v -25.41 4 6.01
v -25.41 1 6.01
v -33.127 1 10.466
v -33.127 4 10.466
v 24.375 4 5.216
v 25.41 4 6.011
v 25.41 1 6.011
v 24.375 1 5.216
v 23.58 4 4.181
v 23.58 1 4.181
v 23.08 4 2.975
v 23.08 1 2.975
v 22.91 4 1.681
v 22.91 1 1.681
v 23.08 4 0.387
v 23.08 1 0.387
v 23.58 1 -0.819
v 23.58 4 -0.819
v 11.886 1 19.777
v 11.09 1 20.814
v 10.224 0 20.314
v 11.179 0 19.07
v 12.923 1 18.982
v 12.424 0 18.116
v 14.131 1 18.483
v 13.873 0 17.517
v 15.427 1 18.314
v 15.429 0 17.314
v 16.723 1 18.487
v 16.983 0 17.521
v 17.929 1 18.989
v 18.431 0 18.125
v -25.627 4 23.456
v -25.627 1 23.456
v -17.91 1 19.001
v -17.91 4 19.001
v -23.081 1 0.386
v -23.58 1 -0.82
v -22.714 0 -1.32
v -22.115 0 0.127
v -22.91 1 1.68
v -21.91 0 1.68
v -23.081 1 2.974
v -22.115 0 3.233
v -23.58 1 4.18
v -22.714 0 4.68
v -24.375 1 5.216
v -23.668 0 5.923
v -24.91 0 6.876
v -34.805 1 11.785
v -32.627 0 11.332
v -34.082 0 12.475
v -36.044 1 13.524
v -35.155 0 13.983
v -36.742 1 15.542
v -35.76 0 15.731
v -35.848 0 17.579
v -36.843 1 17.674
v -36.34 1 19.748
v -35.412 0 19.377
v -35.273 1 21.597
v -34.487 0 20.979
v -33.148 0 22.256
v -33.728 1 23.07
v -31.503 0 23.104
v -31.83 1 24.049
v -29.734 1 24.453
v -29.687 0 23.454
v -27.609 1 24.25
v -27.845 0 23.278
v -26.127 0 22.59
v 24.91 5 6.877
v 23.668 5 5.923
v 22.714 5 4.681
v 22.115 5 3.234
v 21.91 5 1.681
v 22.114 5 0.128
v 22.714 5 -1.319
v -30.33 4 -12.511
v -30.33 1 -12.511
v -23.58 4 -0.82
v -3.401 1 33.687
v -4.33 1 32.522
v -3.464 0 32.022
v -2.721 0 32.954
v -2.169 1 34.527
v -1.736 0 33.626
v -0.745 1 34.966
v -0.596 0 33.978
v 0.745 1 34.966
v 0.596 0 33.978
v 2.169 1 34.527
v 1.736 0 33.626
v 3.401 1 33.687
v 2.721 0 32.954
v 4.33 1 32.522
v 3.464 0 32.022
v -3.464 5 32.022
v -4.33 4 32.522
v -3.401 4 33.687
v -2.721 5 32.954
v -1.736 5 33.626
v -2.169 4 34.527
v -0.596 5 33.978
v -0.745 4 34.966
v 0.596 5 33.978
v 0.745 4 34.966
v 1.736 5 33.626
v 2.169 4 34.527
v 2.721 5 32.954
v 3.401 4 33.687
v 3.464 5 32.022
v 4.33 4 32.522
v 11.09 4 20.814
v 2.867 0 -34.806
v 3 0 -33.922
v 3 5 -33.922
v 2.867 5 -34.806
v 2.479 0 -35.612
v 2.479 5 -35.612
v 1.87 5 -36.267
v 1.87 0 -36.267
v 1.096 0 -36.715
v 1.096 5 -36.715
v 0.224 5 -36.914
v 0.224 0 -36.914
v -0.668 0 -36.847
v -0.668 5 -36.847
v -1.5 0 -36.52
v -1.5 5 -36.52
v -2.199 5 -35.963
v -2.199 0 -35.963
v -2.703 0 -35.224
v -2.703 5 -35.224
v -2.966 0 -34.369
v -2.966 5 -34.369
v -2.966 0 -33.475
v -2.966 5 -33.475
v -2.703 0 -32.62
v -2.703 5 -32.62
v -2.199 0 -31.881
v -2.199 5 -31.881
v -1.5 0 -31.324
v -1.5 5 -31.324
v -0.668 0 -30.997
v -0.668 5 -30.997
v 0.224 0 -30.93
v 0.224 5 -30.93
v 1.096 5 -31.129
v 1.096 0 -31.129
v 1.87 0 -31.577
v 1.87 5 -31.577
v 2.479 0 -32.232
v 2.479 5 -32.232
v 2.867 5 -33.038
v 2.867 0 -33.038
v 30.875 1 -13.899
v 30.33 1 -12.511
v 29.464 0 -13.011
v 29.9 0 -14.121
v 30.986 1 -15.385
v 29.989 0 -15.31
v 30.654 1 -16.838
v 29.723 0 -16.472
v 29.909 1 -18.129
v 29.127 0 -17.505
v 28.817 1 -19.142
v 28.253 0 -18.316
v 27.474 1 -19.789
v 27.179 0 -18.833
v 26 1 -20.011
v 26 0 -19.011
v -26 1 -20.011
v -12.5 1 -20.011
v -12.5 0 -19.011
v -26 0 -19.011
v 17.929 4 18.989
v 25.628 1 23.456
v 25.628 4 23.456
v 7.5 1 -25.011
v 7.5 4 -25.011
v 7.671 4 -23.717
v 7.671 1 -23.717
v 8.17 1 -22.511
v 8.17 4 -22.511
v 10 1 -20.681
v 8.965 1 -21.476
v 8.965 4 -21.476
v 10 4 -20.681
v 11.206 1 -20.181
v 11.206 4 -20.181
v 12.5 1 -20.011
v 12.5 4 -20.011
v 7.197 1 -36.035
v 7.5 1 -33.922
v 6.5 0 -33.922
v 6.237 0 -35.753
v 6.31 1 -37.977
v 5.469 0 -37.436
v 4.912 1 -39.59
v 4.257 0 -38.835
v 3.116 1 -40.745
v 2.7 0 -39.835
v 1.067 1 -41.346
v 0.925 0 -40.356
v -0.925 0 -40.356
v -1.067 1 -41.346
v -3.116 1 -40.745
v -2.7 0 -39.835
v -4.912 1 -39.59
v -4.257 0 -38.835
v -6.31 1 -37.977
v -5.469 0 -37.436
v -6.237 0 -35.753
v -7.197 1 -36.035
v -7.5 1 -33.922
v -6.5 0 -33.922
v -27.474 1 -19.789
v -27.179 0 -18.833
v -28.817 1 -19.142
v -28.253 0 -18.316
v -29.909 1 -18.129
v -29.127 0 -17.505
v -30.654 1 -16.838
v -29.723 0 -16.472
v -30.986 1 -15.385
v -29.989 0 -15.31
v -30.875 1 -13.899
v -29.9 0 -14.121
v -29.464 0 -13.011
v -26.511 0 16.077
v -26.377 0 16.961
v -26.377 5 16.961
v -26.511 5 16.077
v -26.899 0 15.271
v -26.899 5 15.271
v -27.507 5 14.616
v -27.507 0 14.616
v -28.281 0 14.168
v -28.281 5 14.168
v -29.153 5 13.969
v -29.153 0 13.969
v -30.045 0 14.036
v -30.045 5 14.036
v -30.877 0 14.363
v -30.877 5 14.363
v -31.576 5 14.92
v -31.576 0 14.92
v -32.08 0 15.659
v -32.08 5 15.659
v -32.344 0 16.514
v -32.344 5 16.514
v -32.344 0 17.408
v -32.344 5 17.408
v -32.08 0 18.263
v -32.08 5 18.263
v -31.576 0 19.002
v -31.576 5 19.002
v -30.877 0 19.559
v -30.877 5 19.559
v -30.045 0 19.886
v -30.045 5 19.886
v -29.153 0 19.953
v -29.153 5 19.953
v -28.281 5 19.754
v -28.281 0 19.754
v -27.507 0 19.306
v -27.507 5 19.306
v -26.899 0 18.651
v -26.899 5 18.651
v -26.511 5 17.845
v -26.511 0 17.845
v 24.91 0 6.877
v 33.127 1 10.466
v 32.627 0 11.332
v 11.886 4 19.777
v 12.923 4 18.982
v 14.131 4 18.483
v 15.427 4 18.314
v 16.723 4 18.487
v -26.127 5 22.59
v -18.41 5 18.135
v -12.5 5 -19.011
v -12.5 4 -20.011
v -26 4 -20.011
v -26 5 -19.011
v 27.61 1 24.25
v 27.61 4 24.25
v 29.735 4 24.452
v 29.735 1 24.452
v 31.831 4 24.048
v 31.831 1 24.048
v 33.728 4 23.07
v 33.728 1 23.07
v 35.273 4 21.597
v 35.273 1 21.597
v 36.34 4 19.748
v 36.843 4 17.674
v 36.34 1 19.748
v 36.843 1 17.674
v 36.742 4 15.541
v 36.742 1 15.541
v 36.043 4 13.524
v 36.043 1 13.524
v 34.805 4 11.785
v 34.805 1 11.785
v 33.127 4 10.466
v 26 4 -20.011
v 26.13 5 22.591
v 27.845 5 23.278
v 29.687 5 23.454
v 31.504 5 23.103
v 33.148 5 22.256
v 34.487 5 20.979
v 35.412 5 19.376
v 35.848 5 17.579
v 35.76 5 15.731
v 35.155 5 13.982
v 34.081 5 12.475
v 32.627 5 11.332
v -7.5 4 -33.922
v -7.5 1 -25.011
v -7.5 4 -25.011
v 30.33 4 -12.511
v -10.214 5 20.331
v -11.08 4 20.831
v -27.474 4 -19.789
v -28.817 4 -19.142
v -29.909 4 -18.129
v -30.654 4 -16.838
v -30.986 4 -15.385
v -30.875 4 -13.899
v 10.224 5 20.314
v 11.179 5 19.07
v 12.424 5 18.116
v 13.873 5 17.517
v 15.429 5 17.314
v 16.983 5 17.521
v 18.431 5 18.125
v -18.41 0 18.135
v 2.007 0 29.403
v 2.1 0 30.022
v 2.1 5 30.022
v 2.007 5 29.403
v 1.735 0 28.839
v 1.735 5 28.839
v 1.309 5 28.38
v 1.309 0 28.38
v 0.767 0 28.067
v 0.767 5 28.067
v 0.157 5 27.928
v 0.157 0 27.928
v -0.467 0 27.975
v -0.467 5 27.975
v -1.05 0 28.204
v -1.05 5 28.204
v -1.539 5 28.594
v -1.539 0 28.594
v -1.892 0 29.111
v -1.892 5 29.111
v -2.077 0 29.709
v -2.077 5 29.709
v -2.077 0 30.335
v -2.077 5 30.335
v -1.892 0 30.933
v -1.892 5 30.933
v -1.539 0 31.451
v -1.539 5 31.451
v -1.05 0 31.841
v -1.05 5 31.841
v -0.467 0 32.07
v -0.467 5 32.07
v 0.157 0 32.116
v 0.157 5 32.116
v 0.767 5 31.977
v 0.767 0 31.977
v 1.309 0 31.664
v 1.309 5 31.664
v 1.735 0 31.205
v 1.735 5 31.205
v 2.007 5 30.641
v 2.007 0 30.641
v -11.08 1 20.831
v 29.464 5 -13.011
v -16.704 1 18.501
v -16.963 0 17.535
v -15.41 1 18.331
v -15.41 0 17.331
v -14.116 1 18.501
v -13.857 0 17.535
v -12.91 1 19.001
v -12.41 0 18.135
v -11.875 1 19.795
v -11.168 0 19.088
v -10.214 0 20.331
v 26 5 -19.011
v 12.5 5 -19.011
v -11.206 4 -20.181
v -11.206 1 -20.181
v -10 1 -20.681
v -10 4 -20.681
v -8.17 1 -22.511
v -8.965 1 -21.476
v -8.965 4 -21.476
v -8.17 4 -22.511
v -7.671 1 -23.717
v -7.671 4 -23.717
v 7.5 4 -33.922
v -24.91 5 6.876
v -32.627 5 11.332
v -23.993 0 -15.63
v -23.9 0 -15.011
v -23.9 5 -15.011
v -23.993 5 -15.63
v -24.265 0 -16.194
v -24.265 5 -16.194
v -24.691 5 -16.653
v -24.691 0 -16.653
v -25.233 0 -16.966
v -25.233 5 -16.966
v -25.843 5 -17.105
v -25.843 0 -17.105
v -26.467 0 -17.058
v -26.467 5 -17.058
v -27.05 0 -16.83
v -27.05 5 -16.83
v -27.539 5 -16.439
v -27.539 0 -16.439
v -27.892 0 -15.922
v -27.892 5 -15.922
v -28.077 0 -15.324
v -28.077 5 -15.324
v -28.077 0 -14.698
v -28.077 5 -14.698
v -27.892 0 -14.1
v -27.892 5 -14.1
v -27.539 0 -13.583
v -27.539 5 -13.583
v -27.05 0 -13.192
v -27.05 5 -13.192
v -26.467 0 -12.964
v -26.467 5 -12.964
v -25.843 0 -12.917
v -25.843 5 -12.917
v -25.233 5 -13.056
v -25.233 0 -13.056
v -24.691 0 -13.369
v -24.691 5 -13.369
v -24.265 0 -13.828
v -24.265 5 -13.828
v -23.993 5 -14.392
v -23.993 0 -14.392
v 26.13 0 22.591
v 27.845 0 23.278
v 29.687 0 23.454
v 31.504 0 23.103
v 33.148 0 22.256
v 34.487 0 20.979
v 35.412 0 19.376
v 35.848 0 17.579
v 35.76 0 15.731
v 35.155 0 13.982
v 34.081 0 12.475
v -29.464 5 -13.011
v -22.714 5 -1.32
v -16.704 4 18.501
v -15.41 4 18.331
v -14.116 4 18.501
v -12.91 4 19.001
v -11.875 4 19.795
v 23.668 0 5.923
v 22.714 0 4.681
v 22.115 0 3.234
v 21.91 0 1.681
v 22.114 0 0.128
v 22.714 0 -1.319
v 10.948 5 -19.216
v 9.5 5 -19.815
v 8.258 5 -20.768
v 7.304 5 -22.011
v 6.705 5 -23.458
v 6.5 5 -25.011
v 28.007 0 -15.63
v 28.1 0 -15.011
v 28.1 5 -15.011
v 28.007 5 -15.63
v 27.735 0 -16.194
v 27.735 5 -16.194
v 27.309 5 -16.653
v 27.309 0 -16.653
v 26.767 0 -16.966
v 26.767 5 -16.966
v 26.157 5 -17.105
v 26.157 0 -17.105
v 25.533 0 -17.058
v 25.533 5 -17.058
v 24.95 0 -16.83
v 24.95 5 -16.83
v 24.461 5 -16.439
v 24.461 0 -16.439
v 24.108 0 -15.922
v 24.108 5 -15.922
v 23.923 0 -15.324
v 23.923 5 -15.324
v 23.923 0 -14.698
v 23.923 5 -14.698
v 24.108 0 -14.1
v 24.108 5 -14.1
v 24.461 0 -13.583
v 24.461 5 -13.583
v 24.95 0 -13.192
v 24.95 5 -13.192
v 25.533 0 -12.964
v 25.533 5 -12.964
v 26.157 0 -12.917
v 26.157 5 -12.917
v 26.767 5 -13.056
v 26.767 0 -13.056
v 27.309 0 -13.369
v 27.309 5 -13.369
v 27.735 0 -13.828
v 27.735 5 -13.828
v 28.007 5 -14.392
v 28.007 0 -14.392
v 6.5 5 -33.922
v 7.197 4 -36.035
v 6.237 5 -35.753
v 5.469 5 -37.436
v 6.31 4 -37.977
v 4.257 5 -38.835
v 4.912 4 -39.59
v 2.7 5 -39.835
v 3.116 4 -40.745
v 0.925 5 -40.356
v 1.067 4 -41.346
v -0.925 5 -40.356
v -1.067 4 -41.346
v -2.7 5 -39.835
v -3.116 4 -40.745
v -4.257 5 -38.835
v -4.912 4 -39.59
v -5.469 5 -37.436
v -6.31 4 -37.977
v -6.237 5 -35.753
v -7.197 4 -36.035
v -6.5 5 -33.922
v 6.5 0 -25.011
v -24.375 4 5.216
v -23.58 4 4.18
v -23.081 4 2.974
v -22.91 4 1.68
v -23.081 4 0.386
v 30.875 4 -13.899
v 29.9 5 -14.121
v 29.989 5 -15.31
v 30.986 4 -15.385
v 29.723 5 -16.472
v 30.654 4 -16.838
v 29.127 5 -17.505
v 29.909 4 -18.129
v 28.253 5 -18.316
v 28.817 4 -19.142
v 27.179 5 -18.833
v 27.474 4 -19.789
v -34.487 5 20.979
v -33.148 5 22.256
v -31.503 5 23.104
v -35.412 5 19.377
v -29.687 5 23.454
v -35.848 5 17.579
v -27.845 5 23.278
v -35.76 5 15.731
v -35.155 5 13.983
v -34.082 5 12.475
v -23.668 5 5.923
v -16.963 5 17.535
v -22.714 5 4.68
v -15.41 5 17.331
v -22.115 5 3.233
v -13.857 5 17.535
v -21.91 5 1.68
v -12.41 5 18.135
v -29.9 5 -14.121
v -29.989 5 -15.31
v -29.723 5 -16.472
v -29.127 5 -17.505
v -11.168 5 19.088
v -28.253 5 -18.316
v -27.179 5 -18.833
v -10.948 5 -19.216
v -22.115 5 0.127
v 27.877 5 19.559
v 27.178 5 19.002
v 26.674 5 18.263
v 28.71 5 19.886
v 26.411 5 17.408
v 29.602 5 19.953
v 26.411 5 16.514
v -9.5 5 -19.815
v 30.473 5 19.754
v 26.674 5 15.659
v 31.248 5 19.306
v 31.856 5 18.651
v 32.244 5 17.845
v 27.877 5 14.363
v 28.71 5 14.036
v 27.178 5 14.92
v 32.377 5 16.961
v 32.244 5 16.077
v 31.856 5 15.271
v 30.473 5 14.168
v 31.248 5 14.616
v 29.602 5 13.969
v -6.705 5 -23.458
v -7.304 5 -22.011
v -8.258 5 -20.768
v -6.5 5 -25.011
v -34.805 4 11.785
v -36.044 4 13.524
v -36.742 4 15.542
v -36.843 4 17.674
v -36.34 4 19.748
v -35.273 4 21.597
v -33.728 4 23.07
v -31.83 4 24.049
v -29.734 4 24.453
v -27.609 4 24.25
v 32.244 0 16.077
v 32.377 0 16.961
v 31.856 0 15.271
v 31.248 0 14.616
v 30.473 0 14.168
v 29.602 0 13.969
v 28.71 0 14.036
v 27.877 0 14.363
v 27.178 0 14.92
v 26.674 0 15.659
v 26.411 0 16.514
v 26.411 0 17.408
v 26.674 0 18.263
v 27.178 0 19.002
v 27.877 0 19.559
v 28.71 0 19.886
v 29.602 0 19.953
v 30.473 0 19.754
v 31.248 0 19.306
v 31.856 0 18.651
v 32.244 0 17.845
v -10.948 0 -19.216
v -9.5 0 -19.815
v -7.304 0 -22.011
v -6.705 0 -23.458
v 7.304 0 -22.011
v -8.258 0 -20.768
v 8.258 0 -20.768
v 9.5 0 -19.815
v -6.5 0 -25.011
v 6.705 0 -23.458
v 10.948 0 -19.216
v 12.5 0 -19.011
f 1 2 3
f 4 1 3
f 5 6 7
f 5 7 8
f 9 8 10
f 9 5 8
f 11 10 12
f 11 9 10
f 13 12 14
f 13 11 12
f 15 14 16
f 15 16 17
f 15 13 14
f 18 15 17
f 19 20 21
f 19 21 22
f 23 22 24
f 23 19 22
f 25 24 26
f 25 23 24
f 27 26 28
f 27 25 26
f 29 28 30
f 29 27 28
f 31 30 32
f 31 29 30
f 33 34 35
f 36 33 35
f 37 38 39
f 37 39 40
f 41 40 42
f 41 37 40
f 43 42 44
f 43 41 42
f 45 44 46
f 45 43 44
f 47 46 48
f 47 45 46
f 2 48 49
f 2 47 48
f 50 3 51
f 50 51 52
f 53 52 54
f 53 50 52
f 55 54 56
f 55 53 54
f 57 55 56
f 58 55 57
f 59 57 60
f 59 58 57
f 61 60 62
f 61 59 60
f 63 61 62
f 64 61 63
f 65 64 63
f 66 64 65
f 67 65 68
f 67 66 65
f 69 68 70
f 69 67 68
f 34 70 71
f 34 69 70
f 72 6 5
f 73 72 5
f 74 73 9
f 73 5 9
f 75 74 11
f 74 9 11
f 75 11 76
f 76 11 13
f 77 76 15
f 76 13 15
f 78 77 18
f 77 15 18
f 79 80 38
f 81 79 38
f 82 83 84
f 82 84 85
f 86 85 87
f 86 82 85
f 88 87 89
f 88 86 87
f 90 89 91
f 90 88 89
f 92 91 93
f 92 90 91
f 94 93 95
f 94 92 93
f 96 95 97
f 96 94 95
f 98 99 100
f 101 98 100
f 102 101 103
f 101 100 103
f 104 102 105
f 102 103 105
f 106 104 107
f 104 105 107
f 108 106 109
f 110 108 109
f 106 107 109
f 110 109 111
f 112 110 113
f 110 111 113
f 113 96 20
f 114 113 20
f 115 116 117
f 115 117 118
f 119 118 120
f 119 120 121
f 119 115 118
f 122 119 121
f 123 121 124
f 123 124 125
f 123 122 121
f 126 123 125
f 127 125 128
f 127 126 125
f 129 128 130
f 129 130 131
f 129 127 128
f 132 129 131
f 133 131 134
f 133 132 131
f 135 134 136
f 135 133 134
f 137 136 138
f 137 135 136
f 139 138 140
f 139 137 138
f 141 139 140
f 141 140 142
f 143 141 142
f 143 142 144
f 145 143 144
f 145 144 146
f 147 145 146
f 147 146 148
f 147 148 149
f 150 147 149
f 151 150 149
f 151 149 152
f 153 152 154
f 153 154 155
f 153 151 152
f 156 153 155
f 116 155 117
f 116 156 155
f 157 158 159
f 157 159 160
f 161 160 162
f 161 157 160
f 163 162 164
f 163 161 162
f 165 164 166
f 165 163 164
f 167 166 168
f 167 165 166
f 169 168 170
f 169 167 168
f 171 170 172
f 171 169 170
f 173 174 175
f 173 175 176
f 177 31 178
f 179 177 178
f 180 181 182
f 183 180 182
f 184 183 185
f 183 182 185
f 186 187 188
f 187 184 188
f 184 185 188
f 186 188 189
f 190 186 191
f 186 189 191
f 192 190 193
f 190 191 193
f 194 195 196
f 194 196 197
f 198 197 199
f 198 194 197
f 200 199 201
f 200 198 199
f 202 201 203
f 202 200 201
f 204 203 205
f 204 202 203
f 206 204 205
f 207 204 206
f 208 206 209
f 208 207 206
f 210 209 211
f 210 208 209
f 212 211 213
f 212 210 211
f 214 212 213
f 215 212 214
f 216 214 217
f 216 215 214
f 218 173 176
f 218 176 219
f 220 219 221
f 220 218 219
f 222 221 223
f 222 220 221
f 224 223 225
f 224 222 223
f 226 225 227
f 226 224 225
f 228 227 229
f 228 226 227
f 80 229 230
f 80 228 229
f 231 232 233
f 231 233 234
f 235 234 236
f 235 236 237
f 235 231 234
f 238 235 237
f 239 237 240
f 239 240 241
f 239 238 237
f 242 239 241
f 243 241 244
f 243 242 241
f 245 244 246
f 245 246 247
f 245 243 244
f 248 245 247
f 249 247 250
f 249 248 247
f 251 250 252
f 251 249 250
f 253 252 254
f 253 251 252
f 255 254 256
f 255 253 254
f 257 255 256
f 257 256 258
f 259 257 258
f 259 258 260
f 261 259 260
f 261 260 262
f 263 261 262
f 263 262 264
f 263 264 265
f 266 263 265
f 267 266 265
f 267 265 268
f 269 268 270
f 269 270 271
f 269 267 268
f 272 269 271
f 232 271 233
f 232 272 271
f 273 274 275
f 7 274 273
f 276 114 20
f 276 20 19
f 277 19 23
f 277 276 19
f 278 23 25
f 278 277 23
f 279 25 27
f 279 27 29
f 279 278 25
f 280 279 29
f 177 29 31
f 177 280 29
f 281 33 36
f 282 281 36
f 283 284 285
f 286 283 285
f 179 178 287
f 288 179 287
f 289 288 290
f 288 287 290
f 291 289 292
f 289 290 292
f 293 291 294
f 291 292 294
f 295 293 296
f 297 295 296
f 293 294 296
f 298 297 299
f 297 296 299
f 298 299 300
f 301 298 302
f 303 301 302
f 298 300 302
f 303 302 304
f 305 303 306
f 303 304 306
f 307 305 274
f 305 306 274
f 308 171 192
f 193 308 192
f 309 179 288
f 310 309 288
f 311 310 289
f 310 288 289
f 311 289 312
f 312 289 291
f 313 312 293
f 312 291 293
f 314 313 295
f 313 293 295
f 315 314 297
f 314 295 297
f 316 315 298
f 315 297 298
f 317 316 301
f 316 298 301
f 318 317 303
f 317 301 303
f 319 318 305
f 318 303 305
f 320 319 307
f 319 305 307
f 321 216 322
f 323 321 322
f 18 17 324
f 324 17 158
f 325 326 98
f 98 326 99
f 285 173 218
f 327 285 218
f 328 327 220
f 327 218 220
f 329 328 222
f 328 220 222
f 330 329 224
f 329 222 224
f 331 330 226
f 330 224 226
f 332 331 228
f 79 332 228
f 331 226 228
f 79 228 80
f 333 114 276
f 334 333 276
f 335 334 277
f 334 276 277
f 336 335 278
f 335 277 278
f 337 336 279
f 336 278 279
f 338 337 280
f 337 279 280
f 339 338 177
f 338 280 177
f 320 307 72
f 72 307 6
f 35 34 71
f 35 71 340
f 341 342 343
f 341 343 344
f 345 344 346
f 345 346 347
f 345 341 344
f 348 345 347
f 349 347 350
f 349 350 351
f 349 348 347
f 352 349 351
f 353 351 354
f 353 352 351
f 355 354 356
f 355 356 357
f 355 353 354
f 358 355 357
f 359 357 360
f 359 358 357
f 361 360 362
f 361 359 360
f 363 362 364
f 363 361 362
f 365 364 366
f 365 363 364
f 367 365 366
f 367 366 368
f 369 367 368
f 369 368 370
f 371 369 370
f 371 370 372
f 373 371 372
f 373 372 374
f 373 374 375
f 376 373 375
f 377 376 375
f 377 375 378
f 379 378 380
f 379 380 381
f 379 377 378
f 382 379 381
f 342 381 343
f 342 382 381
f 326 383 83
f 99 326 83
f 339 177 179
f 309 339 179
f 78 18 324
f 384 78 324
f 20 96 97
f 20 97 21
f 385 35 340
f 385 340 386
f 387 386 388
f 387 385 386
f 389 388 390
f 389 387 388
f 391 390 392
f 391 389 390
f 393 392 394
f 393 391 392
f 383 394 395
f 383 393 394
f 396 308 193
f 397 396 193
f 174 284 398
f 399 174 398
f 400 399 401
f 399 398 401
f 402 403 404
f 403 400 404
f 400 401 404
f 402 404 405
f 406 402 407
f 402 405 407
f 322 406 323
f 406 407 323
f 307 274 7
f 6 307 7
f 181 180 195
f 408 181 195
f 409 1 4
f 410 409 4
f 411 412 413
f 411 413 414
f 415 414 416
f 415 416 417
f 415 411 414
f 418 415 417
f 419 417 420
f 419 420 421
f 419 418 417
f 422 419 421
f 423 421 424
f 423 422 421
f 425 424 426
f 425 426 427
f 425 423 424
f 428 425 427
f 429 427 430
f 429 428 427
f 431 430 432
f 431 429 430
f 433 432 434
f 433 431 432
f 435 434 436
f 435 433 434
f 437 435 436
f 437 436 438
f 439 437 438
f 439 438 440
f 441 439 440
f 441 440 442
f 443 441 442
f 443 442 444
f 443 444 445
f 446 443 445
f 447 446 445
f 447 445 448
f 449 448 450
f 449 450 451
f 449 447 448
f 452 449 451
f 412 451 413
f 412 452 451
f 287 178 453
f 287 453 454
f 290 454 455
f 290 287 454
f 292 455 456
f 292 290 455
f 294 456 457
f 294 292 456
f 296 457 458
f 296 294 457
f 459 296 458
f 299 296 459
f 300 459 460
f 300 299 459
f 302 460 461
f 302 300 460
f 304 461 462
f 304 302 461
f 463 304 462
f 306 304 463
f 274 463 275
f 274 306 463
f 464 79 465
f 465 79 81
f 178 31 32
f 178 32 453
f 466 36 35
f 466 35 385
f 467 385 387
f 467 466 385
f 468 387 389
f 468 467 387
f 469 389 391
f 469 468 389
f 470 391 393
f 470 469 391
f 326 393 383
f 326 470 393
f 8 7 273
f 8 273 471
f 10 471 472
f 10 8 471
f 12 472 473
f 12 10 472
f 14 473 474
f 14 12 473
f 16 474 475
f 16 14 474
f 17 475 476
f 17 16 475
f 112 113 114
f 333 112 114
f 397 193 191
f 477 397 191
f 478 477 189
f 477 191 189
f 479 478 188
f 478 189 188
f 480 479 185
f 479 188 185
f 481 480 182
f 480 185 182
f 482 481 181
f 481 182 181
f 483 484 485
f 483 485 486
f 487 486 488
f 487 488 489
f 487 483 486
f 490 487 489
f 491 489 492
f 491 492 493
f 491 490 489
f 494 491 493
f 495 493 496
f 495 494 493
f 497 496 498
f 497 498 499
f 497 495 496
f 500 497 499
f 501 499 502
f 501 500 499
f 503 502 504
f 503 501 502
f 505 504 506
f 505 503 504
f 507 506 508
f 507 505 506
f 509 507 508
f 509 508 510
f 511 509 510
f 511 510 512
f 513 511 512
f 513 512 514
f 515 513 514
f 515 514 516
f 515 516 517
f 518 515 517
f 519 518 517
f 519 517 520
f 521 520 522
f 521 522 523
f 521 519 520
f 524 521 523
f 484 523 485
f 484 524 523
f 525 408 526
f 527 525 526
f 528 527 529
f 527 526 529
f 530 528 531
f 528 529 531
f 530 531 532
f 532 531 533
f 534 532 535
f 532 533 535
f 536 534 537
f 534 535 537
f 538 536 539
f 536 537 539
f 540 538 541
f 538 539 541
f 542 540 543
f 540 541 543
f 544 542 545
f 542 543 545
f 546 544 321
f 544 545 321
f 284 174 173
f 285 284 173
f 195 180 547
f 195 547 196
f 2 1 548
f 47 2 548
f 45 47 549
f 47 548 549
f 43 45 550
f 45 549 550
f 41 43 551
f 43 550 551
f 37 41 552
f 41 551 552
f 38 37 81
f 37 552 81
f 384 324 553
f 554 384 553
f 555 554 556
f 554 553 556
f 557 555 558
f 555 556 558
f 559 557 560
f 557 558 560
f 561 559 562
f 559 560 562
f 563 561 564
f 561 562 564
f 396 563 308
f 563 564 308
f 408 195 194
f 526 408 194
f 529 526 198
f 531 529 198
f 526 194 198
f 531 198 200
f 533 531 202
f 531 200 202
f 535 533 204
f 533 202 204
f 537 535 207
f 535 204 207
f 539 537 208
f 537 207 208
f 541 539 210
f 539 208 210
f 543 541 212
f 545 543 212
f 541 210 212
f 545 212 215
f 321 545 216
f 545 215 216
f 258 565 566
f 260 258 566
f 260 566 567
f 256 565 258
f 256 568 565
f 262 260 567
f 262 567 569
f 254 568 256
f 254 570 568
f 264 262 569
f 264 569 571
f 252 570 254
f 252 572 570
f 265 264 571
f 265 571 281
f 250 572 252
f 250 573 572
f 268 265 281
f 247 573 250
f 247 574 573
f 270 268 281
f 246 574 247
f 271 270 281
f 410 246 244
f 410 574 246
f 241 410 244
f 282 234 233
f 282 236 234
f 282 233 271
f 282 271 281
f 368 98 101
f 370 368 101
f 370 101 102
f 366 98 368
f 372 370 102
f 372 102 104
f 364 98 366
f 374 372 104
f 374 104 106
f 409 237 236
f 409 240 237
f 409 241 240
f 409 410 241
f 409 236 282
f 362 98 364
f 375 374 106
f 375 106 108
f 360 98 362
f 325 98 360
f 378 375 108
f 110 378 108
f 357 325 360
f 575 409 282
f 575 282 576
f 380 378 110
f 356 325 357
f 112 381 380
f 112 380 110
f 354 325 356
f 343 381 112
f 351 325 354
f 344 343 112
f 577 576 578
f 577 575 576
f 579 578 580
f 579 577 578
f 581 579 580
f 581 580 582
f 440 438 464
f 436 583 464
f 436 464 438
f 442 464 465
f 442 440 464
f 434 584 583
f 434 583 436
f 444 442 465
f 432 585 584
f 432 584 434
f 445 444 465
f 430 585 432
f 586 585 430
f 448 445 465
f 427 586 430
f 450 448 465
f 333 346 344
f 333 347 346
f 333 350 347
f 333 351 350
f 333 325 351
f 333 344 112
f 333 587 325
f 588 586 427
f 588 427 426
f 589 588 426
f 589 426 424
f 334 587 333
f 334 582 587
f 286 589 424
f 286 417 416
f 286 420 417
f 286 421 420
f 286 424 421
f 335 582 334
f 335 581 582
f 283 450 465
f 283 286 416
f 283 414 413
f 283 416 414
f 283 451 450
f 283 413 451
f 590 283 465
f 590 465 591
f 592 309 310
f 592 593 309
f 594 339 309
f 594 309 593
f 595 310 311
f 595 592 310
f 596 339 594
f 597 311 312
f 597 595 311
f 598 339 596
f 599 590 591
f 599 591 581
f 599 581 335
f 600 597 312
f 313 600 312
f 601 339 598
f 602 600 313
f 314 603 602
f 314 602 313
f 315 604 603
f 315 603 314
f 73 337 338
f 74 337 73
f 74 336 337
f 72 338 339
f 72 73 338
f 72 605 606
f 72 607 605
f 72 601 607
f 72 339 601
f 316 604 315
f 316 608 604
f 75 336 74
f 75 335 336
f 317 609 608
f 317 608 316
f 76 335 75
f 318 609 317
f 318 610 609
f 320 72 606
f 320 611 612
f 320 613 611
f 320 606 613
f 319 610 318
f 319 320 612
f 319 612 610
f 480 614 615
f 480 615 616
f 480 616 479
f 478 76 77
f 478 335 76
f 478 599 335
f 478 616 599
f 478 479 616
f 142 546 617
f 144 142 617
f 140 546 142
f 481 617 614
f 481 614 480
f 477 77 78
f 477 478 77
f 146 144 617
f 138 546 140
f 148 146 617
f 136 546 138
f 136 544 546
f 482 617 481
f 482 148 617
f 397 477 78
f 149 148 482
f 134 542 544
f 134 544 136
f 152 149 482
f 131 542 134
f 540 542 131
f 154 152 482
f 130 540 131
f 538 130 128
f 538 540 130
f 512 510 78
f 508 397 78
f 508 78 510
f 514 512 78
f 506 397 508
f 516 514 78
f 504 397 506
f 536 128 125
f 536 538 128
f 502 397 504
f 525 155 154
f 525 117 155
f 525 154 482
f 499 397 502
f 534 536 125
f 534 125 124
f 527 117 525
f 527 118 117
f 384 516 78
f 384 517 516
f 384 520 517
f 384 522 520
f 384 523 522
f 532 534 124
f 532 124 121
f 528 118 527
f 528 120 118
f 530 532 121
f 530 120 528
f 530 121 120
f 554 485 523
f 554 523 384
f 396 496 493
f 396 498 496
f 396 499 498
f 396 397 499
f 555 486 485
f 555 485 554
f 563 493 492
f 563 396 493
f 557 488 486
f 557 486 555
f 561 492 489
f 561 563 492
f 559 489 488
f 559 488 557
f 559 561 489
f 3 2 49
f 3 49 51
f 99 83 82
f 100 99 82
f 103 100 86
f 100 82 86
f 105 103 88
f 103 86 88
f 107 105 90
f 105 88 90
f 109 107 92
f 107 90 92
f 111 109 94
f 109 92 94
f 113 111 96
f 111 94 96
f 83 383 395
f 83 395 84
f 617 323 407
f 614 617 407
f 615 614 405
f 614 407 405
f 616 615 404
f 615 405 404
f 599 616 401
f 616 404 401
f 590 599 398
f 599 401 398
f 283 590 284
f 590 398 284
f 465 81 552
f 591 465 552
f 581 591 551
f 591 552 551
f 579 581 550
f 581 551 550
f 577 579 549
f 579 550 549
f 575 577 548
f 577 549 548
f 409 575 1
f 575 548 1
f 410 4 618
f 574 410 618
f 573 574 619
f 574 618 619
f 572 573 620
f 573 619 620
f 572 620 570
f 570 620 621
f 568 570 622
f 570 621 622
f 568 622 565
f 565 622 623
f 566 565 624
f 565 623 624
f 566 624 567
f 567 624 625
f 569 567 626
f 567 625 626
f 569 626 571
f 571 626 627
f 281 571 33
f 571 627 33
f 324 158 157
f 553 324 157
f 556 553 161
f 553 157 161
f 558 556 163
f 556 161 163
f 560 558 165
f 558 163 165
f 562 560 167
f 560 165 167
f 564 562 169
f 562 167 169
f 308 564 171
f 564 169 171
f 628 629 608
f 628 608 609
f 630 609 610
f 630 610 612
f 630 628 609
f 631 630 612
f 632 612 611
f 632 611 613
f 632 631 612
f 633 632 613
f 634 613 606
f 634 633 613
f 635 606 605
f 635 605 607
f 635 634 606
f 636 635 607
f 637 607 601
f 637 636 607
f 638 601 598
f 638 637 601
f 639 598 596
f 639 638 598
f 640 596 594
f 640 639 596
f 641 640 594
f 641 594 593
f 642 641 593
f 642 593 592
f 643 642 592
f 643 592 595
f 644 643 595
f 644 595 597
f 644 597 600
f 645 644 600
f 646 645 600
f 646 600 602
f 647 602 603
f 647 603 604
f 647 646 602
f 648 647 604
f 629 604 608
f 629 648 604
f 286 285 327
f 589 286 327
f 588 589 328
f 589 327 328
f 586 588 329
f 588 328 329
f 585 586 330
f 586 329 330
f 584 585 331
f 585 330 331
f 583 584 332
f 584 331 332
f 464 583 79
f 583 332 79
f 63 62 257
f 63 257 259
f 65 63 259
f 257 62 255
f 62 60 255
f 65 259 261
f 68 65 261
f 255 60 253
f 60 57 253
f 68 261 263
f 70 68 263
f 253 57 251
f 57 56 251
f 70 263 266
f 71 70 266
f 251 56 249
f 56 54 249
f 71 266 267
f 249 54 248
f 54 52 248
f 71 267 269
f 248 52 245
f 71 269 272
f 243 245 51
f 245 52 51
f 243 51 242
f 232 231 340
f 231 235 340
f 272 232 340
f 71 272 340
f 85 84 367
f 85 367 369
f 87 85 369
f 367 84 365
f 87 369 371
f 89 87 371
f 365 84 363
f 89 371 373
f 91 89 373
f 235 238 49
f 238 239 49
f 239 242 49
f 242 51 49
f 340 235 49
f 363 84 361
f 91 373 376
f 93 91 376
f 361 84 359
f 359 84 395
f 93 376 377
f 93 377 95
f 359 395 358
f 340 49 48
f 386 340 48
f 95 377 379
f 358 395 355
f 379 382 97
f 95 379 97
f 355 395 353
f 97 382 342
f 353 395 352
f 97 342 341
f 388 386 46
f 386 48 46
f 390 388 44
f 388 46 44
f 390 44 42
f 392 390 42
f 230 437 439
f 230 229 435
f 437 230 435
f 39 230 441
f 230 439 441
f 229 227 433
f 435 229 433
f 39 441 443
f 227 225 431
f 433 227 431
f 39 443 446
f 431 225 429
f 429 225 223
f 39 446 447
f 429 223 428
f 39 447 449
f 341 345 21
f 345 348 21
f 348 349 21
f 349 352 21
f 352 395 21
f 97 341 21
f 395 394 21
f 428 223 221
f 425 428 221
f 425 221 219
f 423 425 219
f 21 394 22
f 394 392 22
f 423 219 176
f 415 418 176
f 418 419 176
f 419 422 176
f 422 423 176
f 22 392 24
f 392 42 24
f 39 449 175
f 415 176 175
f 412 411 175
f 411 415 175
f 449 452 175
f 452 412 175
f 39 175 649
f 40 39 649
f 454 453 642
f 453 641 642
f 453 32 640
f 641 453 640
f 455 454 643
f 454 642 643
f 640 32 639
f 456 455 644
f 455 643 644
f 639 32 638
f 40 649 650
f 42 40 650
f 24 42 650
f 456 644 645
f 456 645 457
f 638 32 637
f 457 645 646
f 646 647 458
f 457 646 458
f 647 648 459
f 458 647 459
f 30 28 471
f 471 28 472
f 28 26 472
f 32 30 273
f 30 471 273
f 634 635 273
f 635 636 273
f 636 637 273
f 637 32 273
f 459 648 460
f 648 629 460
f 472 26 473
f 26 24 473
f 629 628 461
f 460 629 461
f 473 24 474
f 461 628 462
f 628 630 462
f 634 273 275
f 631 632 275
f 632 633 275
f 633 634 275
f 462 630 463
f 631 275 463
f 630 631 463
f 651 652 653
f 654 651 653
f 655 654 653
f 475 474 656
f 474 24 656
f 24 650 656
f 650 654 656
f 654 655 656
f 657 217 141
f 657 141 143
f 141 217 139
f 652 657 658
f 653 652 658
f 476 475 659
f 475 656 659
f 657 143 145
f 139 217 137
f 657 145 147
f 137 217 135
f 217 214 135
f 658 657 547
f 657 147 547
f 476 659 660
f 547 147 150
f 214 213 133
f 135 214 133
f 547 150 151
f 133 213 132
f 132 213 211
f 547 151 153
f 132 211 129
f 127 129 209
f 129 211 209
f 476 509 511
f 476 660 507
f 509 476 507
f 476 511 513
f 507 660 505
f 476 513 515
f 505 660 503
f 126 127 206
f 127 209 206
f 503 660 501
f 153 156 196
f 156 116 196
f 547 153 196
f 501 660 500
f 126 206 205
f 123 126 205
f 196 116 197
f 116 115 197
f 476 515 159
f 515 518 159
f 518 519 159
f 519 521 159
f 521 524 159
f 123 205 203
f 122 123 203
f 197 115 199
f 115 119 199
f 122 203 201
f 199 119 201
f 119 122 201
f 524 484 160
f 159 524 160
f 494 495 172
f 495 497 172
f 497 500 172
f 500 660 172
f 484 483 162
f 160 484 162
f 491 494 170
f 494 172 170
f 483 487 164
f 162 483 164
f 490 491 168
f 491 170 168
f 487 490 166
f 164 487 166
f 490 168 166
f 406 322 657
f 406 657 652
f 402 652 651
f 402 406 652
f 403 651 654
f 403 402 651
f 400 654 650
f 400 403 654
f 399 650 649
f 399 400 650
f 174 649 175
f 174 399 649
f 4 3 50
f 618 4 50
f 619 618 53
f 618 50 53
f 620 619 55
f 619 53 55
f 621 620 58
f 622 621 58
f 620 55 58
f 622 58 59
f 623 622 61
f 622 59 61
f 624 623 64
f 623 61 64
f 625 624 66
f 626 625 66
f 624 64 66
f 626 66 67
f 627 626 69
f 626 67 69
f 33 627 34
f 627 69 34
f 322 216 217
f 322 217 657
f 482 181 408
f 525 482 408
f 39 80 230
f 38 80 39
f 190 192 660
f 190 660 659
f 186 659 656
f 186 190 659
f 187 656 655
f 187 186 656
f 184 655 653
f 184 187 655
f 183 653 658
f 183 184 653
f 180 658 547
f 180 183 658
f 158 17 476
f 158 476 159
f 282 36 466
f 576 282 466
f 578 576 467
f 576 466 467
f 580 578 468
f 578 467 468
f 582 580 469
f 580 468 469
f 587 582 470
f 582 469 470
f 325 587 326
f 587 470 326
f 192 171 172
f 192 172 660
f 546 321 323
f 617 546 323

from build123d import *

# Parameters (mm, degrees)
EXTRUDE_2_OUTLINE_R   = 3
EXTRUDE_2_OUTLINE_R_2 = 2.1
EXTRUDE_2_DEPTH       = 5
FILLET_1_R            = 5
CHAMFER_1_SIZE        = 1
CHAMFER_2_SIZE        = 1


# Read off the part's stored shape, not the designer's step: ﾎﾞｽ - 押し出し2
with BuildPart() as part:
    # ﾎﾞｽ - 押し出し2 outline → ﾎﾞｽ - 押し出し2 (new body)
    with BuildSketch(Plane(origin=(0, 0, 0), x_dir=(1, 0, 0), z_dir=(0, 1, 0))):
        with BuildLine():
            Line((-25.627313747, -23.456190528), (-13.58012702, -16.500744028))
            Line((-13.58012702, -16.500744028), (-4.330127019, -32.522214))
            ThreePointArc((-4.330127019, -32.522214), (0, -35.022214), (4.330127019, -32.522214))
            Line((4.330127019, -32.522214), (13.595203608, -16.474630613))
            Line((13.595203608, -16.474630613), (25.627663459, -23.456392422))
            ThreePointArc((25.627663459, -23.456392422), (35.872706169, -20.710650288), (33.126964036, -10.465607578))
            Line((33.126964036, -10.465607578), (21.079752539, -3.511011592))
            Line((21.079752539, -3.511011592), (30.330127021, 12.511107))
            ThreePointArc((30.330127021, 12.511107), (30.330127021, 17.511107), (26.000000002, 20.011107))
            Line((26.000000002, 20.011107), (7.500451194, 20.011107))
            Line((7.500451194, 20.011107), (7.500451194, 33.922))
            ThreePointArc((7.500451194, 33.922), (0, 41.422451194), (-7.500451194, 33.922))
            Line((-7.500451194, 33.922), (-7.500451194, 20.011107))
            Line((-7.500451194, 20.011107), (-26.000000002, 20.011107))
            ThreePointArc((-26.000000002, 20.011107), (-30.330127021, 17.511107), (-30.330127021, 12.511107))
            Line((-30.330127021, 12.511107), (-21.08012702, -3.510362972))
            Line((-21.08012702, -3.510362972), (-33.127313747, -10.465809472))
            ThreePointArc((-33.127313747, -10.465809472), (-35.872504276, -20.711), (-25.627313747, -23.456190528))
        make_face()
        with Locations((-29.377313747, -16.961)):
            Circle(EXTRUDE_2_OUTLINE_R, mode=Mode.SUBTRACT)
        with Locations((0, -30.022214)):
            Circle(EXTRUDE_2_OUTLINE_R_2, mode=Mode.SUBTRACT)
        with Locations((29.377313747, -16.961)):
            Circle(EXTRUDE_2_OUTLINE_R, mode=Mode.SUBTRACT)
        with Locations((-26.000000002, 15.011107)):
            Circle(EXTRUDE_2_OUTLINE_R_2, mode=Mode.SUBTRACT)
        with Locations((26.000000002, 15.011107)):
            Circle(EXTRUDE_2_OUTLINE_R_2, mode=Mode.SUBTRACT)
        with Locations((0, 33.922)):
            Circle(EXTRUDE_2_OUTLINE_R, mode=Mode.SUBTRACT)
    extrude(amount=EXTRUDE_2_DEPTH)

    # ﾌｨﾚｯﾄ1
    fillet_1_edges = [part.edges().sort_by_distance(p)[0] for p in [
        (-13.58012702, 2.5, 16.500744028),
        (-21.08012702, 2.5, 3.510362972),
        (-7.500451194, 2.5, -20.011107),
        (7.500451194, 2.5, -20.011107),
        (21.079752539, 2.5, 3.511011592),
        (13.595203608, 2.5, 16.474630613),
    ]]
    fillet(fillet_1_edges, radius=FILLET_1_R)

    # 面取り1
    chamfer_1_edges = [part.edges().sort_by_distance(p)[0] for p in [
        (-14.116158813, 0, 18.501241916),
        (-21.768783893, 0, 21.228467278),
        (-35.872504276, 0, 20.711),
        (-29.268783893, 0, 8.238086222),
        (-30.330127021, 0, -17.511107),
        (-19.250225598, 0, -20.011107),
        (-7.500451194, 0, -29.4665535),
        (0, 0, -41.422451194),
        (7.500451194, 0, -29.4665535),
        (30.330127021, 0, -17.511107),
        (26.955007083, 0, -6.665227785),
        (29.26860567, 0, 8.238260311),
        (35.872706169, 0, 20.710650288),
        (21.778474587, 0, 21.222923938),
        (0, 0, 35.022214),
        (-7.705127019, 0, 26.676542524),
        (7.709952964, 0, 26.668183744),
        (19.250225598, 0, -20.011107),
        (-26.95512702, 0, -6.665435523),
        (14.131045637, 0, 18.483124699),
        (23.080419871, 0, 2.97487667),
        (8.964917288, 0, -21.475573094),
        (-8.964917288, 0, -21.475573094),
        (-23.080624907, 0, 2.974331179),
    ]]
    chamfer(chamfer_1_edges, length=CHAMFER_1_SIZE)

    # 面取り2
    chamfer_2_edges = [part.edges().sort_by_distance(p)[0] for p in [
        (-7.705127019, 5, 26.676542524),
        (-23.080624907, 5, 2.974331179),
        (-14.116158813, 5, 18.501241916),
        (0, 5, 35.022214),
        (21.778474587, 5, 21.222923938),
        (35.872706169, 5, 20.710650288),
        (29.26860567, 5, 8.238260311),
        (26.955007083, 5, -6.665227785),
        (30.330127021, 5, -17.511107),
        (7.500451194, 5, -29.4665535),
        (0, 5, -41.422451194),
        (-7.500451194, 5, -29.4665535),
        (-19.250225598, 5, -20.011107),
        (-30.330127021, 5, -17.511107),
        (-29.268783893, 5, 8.238086222),
        (-35.872504276, 5, 20.711),
        (7.709952964, 5, 26.668183744),
        (-21.768783893, 5, 21.228467278),
        (19.250225598, 5, -20.011107),
        (-26.95512702, 5, -6.665435523),
        (14.131045637, 5, 18.483124699),
        (23.080419871, 5, 2.97487667),
        (8.964917288, 5, -21.475573094),
        (-8.964917288, 5, -21.475573094),
    ]]
    chamfer(chamfer_2_edges, length=CHAMFER_2_SIZE)


solid = part.part
